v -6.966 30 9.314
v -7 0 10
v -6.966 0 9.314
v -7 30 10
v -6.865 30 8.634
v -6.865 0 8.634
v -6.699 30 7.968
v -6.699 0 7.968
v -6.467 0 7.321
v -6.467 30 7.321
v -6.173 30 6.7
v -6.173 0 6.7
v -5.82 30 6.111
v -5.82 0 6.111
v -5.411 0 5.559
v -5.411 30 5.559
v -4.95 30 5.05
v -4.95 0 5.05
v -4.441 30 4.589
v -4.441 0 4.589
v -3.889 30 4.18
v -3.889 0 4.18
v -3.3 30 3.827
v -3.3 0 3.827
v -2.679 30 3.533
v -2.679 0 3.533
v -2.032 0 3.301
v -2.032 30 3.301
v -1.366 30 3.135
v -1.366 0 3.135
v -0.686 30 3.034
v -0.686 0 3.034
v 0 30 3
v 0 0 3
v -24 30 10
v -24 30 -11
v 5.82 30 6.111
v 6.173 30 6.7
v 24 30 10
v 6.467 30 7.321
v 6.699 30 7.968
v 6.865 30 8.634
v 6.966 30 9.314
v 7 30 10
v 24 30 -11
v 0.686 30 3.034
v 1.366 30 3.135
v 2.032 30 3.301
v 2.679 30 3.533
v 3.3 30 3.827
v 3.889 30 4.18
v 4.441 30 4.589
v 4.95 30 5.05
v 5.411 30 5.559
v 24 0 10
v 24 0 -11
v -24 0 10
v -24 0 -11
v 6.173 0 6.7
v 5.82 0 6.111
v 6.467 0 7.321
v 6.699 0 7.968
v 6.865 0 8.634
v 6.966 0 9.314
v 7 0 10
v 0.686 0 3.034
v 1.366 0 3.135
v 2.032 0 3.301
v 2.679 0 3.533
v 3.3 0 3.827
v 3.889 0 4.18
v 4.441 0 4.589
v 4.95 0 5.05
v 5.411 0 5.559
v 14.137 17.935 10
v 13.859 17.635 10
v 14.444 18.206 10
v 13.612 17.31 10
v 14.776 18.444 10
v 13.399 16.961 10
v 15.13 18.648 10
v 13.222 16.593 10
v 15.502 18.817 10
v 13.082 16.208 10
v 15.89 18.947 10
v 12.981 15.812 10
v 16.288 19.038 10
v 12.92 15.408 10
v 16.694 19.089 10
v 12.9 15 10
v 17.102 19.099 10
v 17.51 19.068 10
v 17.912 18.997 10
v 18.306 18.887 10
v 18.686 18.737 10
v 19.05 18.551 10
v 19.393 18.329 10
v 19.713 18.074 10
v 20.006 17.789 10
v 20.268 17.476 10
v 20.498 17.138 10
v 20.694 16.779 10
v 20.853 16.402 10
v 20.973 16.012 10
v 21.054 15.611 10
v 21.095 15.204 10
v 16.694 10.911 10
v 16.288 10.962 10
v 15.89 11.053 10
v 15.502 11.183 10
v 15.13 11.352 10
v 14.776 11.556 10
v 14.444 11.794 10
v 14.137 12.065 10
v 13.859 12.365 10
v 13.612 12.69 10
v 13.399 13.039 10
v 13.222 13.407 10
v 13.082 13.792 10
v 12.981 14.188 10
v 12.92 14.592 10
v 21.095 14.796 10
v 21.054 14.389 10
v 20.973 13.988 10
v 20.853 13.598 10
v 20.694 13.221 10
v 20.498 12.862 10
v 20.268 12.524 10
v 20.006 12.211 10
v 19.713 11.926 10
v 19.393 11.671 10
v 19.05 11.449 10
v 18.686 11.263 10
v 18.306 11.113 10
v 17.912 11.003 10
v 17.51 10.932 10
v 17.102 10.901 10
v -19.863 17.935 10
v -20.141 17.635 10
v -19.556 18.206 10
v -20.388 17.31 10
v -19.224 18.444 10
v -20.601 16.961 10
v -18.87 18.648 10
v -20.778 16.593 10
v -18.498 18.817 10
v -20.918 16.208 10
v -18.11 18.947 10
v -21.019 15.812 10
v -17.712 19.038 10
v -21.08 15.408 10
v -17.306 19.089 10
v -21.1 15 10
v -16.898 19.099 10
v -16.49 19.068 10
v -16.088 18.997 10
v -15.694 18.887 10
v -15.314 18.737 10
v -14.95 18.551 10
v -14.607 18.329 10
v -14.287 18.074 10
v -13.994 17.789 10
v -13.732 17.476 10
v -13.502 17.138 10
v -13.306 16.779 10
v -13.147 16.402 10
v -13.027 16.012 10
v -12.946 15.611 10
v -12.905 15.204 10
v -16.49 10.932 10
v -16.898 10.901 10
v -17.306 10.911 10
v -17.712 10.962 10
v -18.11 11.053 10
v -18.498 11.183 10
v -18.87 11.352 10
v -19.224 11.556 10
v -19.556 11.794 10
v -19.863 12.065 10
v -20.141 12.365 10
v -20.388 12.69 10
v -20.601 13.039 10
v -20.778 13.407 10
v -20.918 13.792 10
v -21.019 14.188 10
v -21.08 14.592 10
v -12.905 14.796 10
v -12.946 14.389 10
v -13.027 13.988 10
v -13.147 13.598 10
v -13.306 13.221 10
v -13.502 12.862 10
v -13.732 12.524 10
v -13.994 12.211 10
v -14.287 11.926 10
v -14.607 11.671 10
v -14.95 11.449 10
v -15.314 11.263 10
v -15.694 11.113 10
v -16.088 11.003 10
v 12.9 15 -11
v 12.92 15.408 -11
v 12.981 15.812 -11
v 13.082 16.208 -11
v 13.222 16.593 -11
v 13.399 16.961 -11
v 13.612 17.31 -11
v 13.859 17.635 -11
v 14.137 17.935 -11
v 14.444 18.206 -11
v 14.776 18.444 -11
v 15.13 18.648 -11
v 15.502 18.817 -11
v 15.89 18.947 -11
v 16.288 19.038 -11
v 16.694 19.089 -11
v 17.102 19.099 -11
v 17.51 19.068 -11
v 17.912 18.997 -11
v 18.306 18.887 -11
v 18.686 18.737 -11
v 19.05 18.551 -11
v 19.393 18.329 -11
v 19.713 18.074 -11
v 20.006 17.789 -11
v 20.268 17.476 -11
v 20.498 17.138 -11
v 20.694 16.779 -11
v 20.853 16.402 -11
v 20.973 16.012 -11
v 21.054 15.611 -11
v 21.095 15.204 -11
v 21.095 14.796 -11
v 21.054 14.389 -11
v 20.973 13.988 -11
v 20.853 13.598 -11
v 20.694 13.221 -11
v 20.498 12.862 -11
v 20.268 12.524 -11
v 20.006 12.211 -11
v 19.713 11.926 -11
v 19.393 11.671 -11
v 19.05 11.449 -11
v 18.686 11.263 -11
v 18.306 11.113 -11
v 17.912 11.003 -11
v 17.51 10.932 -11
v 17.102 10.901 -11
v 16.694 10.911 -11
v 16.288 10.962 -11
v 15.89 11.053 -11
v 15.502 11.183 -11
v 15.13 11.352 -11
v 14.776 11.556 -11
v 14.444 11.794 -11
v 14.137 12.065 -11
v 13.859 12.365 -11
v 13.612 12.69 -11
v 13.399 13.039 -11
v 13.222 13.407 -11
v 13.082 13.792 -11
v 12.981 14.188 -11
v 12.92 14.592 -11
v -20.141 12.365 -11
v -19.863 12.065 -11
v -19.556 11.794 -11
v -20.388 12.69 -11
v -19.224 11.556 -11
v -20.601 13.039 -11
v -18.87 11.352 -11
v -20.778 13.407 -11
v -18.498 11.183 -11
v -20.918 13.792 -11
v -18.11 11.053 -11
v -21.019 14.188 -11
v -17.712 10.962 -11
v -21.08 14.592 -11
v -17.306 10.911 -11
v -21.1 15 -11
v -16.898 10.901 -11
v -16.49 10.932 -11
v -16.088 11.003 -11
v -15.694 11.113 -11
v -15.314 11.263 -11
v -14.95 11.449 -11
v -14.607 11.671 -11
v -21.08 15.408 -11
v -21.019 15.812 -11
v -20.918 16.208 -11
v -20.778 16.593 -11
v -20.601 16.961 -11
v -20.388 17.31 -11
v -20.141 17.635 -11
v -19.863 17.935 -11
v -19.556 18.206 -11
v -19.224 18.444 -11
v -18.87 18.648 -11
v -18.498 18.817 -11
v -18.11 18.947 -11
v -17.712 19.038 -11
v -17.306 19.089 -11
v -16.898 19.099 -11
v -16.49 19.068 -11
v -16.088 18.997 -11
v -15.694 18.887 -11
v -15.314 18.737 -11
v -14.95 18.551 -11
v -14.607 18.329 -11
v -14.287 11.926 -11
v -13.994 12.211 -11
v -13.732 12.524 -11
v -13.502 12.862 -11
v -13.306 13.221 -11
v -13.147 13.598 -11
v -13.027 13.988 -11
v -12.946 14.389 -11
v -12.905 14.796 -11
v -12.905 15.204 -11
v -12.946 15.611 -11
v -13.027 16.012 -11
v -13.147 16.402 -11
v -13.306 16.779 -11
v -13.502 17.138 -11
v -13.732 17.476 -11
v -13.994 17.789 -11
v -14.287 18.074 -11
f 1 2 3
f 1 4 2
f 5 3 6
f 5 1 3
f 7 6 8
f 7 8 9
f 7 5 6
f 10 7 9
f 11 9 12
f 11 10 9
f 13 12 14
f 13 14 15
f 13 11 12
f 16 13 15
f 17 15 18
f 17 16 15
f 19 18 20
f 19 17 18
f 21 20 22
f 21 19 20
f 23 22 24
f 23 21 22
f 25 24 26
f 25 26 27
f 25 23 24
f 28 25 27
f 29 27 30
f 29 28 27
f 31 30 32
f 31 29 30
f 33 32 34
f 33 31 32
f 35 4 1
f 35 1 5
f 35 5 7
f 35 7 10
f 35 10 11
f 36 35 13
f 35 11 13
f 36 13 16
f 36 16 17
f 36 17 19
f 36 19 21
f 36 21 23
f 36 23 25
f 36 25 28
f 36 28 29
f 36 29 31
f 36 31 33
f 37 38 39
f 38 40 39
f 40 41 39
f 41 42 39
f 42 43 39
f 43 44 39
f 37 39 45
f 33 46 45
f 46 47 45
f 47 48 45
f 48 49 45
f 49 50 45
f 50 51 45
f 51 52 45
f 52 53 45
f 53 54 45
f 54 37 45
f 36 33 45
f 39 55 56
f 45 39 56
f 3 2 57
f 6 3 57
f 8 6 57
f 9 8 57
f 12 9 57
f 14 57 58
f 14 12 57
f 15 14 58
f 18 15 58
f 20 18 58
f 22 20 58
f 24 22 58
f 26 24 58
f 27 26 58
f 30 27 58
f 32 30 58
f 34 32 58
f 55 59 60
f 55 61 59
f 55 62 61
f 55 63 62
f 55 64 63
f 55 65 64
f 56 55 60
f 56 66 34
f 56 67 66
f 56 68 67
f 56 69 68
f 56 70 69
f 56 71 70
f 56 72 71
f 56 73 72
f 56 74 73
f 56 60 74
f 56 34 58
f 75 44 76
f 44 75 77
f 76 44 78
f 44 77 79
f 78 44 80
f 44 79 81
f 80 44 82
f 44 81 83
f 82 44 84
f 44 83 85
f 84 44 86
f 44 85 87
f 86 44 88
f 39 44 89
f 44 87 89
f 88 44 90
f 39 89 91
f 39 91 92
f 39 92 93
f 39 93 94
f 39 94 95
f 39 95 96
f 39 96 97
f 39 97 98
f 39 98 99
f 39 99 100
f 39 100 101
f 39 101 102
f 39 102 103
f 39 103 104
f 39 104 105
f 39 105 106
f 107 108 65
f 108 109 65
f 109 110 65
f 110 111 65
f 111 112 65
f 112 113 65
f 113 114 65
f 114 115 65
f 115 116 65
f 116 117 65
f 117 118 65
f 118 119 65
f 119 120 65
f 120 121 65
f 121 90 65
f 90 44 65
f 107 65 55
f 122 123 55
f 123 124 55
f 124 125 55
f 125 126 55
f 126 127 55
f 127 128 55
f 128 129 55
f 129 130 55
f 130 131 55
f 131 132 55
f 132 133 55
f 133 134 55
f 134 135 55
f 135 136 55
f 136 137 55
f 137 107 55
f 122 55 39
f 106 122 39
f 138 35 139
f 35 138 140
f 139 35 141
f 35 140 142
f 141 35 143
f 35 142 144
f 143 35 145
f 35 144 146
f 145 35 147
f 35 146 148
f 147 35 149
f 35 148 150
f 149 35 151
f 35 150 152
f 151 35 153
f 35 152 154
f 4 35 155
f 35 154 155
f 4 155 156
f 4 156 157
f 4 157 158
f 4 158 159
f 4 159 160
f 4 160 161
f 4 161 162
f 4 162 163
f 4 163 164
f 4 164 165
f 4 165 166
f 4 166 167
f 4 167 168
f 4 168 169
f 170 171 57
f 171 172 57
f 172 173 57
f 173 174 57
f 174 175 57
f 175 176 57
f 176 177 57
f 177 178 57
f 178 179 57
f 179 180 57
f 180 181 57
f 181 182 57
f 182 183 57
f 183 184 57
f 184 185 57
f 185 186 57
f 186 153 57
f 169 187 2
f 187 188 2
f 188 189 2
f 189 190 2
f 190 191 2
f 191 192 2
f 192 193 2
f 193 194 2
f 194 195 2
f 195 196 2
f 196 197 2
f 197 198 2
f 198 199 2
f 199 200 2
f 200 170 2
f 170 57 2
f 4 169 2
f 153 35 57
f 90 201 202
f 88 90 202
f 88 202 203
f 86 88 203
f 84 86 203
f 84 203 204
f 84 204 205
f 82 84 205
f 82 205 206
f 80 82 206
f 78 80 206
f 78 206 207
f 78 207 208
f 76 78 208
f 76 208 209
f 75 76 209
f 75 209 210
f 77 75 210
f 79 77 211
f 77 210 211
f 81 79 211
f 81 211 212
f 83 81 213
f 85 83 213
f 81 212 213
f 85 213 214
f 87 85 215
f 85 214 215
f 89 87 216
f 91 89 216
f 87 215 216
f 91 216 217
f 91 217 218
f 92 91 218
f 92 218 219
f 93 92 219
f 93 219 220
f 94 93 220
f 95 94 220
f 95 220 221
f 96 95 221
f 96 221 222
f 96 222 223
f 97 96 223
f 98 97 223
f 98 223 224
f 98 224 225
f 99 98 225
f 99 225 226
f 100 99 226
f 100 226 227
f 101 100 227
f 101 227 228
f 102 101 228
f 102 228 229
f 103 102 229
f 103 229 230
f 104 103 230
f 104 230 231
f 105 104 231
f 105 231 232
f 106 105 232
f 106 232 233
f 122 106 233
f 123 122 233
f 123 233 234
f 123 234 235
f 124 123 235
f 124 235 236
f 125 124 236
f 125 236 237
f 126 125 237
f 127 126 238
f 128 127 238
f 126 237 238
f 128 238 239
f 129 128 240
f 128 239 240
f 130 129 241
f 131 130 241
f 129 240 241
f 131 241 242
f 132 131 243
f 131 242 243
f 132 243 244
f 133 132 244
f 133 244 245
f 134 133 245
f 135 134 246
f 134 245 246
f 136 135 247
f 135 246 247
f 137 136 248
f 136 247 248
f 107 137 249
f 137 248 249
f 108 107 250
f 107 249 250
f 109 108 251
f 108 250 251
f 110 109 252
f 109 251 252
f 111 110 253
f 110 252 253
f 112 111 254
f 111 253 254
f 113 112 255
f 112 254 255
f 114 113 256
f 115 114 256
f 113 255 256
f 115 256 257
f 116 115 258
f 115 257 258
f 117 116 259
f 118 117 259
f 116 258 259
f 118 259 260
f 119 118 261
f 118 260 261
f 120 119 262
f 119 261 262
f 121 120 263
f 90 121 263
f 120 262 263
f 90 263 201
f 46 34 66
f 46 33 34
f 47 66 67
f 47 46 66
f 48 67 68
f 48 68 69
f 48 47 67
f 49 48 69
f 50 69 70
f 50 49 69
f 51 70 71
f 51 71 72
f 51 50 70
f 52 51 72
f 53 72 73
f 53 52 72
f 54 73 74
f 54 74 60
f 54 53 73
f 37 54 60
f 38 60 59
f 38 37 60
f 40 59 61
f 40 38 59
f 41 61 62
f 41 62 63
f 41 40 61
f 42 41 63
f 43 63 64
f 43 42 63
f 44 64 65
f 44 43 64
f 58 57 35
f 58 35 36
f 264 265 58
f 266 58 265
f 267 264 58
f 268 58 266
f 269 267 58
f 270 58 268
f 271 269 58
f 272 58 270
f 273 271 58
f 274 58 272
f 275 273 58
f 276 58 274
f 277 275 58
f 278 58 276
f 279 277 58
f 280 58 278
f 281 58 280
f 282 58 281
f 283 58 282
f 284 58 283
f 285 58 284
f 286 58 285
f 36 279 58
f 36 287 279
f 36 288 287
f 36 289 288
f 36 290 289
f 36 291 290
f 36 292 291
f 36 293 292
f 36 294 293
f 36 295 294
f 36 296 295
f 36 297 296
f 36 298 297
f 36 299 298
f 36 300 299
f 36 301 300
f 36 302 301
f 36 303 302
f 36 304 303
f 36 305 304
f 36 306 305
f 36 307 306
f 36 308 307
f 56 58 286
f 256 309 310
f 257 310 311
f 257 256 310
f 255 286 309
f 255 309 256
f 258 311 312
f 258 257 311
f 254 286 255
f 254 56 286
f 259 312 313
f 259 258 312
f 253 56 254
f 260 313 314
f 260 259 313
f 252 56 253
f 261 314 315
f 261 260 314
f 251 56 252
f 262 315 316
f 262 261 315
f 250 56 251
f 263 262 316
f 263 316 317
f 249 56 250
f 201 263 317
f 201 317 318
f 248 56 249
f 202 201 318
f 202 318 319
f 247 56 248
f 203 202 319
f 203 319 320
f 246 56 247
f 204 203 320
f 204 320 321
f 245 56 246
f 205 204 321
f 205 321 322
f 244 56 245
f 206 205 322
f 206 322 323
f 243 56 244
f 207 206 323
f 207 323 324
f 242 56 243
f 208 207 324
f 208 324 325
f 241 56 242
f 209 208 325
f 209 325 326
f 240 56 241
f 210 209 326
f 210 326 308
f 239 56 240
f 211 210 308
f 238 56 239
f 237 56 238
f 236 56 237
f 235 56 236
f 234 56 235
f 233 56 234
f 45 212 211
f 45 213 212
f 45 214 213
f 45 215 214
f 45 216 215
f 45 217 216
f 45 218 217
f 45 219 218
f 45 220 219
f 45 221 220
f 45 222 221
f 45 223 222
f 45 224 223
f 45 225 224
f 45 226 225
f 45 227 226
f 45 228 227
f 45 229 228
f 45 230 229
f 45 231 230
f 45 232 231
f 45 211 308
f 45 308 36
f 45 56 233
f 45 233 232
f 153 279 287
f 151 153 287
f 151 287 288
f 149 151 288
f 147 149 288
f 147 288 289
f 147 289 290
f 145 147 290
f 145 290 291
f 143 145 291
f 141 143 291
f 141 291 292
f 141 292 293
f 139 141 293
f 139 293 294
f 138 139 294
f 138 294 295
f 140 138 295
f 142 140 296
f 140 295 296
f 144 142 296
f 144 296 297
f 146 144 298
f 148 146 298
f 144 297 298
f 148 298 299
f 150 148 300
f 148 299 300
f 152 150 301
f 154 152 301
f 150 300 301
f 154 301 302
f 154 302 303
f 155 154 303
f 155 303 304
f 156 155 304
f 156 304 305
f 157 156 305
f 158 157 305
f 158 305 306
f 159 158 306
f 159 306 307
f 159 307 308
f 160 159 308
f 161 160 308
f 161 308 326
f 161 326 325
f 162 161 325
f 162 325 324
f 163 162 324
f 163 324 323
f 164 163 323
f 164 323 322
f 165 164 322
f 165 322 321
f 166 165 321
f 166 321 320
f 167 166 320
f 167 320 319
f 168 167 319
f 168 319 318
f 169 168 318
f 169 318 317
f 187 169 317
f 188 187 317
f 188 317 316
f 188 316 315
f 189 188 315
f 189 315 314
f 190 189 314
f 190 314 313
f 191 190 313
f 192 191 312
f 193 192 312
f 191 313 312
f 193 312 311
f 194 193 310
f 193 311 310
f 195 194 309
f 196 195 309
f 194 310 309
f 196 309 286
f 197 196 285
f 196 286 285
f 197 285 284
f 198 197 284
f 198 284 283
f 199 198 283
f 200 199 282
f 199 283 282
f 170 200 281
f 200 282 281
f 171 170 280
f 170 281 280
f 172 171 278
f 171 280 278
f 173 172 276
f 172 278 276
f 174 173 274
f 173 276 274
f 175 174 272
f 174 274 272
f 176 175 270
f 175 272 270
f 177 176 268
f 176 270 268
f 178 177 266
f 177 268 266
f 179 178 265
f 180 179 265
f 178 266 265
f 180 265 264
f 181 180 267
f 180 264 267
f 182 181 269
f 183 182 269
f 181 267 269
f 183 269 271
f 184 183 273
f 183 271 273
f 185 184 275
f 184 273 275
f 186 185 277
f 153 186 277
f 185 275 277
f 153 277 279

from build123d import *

# Parameters (mm, degrees)
SKETCH_1_W          = 48
SKETCH_1_H          = 20
EXTRUDE_1_DEPTH     = 30
SKETCH_2_W          = 14
SKETCH_2_H          = 30
CUT_EXTRUDE_1_DEPTH = 7
SKETCH_7_W          = 22
SKETCH_7_H          = 30
EXTRUDE_2_DEPTH     = 48
SKETCH_8_W          = 21
SKETCH_8_H          = 30
CUT_EXTRUDE_2_DEPTH = 14
SKETCH_9_W          = 21
SKETCH_9_H          = 30
CUT_EXTRUDE_3_DEPTH = 14
SKETCH_11_W         = 10.2
SKETCH_11_H         = 20.2
CUT_EXTRUDE_4_DEPTH = 56.497747702
SKETCH_13_R         = 4.1
CUT_EXTRUDE_5_DEPTH = 44.783558558
FILLET_1_R          = 7
SKETCH1_W           = 10.2
SKETCH1_H           = 20.2
BOSS_EXTRUDE1_DEPTH = 4
SKETCH2_W           = 20
SKETCH2_H           = 21
CUT_EXTRUDE1_DEPTH  = 51


with BuildPart() as part:
    # Эскиз1 → Бобышка-Вытянуть1 (new body)
    with BuildSketch(Plane(origin=(0, 0, 0), x_dir=(1, 0, 0), z_dir=(0, 1, 0))):
        Rectangle(SKETCH_1_W, SKETCH_1_H)
    extrude(amount=EXTRUDE_1_DEPTH)

    # Эскиз2 → Вырез-Вытянуть1 (cut)
    with BuildSketch(Plane.XY.offset(10)):
        with Locations((0, 15)):
            Rectangle(SKETCH_2_W, SKETCH_2_H)
    extrude(amount=-CUT_EXTRUDE_1_DEPTH, mode=Mode.SUBTRACT)

    # Эскиз7 → Бобышка-Вытянуть2 (add)
    with BuildSketch(Plane(origin=(24, 0, 0), x_dir=(0, 0, -1), z_dir=(1, 0, 0))):
        with Locations((21, 15)):
            Rectangle(SKETCH_7_W, SKETCH_7_H)
    extrude(amount=-EXTRUDE_2_DEPTH)

    # Эскиз8 → Вырез-Вытянуть2 (cut)
    with BuildSketch(Plane(origin=(24, 0, 0), x_dir=(0, 0, -1), z_dir=(1, 0, 0))):
        with Locations((21.5, 15)):
            Rectangle(SKETCH_8_W, SKETCH_8_H)
    extrude(amount=-CUT_EXTRUDE_2_DEPTH, mode=Mode.SUBTRACT)

    # Эскиз9 → Вырез-Вытянуть3 (cut)
    with BuildSketch(Plane.ZY.offset(24)):
        with Locations((-21.5, 15)):
            Rectangle(SKETCH_9_W, SKETCH_9_H)
    extrude(amount=-CUT_EXTRUDE_3_DEPTH, mode=Mode.SUBTRACT)

    # Эскиз11 → Вырез-Вытянуть4 (cut, through all)
    with BuildSketch(Plane.ZY.offset(10)):
        with Locations((-21.5, 15)):
            Rectangle(SKETCH_11_W, SKETCH_11_H)
    extrude(amount=-CUT_EXTRUDE_4_DEPTH, mode=Mode.SUBTRACT)

    # Эскиз13 → Вырез-Вытянуть5 (cut, through all)
    with BuildSketch(Plane(origin=(0, 0, -11), x_dir=(-1, 0, 0), z_dir=(0, 0, -1))):
        with Locations((17, 15)):
            Circle(SKETCH_13_R)
        with Locations((-17, 15)):
            Circle(SKETCH_13_R)
    extrude(amount=-CUT_EXTRUDE_5_DEPTH, mode=Mode.SUBTRACT)

    # Скругление1
    fillet_1_edges = [part.edges().sort_by_distance(p)[0] for p in [
        (-7, 15, 3),
        (7, 15, 3),
    ]]
    fillet(fillet_1_edges, radius=FILLET_1_R - 0.0001)  # a hair under: the kernel refuses the full size

    # Sketch1 → Boss-Extrude1 (add)
    with BuildSketch(Plane(origin=(10, 0, 0), x_dir=(0, 0, -1), z_dir=(1, 0, 0))):
        with Locations((21.5, 15)):
            Rectangle(SKETCH1_W, SKETCH1_H)
    extrude(amount=-BOSS_EXTRUDE1_DEPTH)

    # Sketch2 → Cut-Extrude1 (cut, through all)
    with BuildSketch(Plane(origin=(0, 30, 0), x_dir=(1, 0, 0), z_dir=(0, 1, 0))):
        with Locations((0, 21.5)):
            Rectangle(SKETCH2_W, SKETCH2_H)
    extrude(amount=-CUT_EXTRUDE1_DEPTH, mode=Mode.SUBTRACT)


solid = part.part
